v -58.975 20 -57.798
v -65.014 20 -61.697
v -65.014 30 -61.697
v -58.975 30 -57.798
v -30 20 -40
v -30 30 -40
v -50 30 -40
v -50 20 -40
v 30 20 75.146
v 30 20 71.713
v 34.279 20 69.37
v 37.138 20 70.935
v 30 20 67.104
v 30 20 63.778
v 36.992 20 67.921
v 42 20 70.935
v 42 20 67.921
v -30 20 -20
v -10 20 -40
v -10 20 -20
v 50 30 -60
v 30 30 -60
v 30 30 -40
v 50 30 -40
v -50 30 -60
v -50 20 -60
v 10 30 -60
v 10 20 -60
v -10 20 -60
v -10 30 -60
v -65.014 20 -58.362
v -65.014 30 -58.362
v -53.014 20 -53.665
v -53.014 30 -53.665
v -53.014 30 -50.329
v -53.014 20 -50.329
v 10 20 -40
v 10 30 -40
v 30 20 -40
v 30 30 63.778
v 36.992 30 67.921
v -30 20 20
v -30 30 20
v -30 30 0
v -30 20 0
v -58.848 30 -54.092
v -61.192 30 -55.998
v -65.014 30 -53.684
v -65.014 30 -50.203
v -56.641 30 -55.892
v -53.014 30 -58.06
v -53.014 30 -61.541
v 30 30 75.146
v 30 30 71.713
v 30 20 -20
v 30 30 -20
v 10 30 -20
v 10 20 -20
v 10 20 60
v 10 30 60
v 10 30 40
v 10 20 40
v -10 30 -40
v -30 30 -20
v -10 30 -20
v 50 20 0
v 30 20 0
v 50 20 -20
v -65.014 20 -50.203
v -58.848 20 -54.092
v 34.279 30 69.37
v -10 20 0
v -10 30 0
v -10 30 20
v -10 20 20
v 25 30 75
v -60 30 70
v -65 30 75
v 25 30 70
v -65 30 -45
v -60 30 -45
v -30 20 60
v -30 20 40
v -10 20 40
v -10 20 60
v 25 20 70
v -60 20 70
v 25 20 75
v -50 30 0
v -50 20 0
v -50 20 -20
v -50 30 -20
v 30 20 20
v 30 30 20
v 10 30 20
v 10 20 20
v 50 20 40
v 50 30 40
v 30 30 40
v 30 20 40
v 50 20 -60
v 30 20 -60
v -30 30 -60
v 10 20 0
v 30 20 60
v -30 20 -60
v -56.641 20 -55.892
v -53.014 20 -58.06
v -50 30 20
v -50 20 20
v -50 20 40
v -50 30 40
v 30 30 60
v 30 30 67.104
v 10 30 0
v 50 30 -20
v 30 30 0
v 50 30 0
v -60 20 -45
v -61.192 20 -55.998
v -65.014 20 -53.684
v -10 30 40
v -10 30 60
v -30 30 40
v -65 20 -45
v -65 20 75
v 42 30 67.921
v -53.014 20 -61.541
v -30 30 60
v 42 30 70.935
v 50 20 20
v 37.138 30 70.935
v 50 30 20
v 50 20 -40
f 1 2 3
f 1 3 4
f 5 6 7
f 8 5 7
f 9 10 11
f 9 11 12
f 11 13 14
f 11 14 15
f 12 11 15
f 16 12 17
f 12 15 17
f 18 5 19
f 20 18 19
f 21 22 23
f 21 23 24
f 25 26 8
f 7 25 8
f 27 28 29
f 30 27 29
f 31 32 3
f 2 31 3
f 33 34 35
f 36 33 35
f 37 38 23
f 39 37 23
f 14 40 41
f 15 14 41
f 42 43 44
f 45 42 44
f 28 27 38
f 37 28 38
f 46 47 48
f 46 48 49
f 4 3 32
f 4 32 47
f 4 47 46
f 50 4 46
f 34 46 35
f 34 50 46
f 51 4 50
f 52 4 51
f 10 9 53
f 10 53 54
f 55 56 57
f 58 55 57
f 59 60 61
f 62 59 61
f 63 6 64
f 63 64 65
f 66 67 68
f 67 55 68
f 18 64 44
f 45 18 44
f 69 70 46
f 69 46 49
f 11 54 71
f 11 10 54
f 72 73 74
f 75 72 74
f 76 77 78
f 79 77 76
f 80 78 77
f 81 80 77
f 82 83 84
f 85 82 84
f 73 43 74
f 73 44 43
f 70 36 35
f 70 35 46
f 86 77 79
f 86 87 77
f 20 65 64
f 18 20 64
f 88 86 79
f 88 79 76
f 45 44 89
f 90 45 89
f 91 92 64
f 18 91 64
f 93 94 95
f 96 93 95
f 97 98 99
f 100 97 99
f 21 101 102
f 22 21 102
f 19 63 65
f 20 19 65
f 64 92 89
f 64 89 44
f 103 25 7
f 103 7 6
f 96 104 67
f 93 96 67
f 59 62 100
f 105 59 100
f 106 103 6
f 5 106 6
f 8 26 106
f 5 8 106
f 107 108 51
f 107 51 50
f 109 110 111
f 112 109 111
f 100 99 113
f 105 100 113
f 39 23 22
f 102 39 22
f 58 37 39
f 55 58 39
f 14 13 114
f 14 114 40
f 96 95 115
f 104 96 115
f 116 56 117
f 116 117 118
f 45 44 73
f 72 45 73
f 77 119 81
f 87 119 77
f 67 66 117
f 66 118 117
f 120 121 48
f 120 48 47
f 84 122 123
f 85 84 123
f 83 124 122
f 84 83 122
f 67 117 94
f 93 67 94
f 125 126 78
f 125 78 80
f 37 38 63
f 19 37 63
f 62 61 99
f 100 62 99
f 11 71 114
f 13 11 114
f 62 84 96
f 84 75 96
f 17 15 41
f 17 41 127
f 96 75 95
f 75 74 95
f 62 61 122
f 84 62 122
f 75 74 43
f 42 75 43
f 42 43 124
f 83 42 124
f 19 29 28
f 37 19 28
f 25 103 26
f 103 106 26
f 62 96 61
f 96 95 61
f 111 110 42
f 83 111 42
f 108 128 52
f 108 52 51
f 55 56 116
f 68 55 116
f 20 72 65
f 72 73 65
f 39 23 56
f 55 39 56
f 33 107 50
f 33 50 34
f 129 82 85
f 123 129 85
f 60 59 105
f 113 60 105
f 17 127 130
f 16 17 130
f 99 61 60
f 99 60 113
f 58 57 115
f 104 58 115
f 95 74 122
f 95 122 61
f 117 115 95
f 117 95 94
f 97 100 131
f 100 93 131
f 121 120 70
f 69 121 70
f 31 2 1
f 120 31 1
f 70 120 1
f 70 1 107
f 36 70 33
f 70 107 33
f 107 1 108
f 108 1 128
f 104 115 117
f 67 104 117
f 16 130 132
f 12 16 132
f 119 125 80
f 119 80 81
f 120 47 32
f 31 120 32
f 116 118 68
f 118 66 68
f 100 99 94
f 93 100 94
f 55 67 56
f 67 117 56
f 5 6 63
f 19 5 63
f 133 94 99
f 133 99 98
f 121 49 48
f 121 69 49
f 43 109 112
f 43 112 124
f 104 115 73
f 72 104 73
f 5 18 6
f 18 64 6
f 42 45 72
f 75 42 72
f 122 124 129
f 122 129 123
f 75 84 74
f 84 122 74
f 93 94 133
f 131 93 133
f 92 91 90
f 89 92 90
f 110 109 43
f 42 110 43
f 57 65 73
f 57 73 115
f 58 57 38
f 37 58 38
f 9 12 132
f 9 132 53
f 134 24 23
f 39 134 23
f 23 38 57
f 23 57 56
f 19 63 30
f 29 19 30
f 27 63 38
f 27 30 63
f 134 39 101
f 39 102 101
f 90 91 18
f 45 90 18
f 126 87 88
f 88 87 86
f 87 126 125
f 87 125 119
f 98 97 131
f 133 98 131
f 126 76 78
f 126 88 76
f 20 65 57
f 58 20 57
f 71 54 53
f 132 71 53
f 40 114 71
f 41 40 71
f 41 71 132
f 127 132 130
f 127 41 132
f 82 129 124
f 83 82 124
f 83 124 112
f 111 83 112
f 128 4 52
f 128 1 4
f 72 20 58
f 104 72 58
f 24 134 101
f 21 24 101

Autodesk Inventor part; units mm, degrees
ref_plane "YZ Plane" through (0, 0, 0) normal (1, 0, 0) x (0, 1, 0)
ref_plane "XZ Plane" through (0, 0, 0) normal (0, 1, 0) x (-1, 0, 0)
ref_plane "XY Plane" through (0, 0, 0) normal (0, 0, 1) x (1, 0, 0)
sketch "Sketch1" plane through (0, 0, 0) normal (0, 1, 0) x (-1, 0, 0)
  line L0 (70, 80) -> (-70, 80)
  line L1 (-70, 80) -> (-70, -80)
  line L2 (-70, -80) -> (70, -80)
  line L3 (70, -80) -> (70, 80)
  point P0 (0, 0)
  dimension "d13" = 20
  dimension "d0" = 140
  dimension "d1" = 160
  dimension "d4" = 70
  dimension "d5" = 80
extrude "Extrusion1" add sketch "Sketch1" along normal blind 20
sketch "Sketch2" plane through (0, 20, 0) normal (0, 1, 0) x (1, 0, 0)
  line L0 (50, 60) -> (-50, 60)
  line L1 (-50, 60) -> (-50, -60)
  line L2 (-50, -60) -> (50, -60)
  line L3 (50, -60) -> (50, 60)
  line L4 (50, 60) -> (-50, -60) construction
  line L5 (-50, 60) -> (50, -60) construction
  point P0 (0, 0)
  dimension "d8" = 100
  dimension "d9" = 120
extrude "Extrusion2" add sketch "Sketch2" along normal blind 10
sketch "Sketch3" plane through (0, 30, 0) normal (0, 1, 0) x (1, 0, 0)
  line L0 (-50, 60) -> (-50, -60) projected
  line L1 (-50, -60) -> (-30, -60)
  line L2 (-30, -60) -> (-30, -40)
  line L3 (-30, -40) -> (-50, -40)
  line L4 (-50, -40) -> (-50, -60)
  line L5 (-10, -60) -> (10, -60)
  line L6 (10, -60) -> (10, -40)
  line L7 (10, -40) -> (-10, -40)
  line L8 (-10, -40) -> (-10, -60)
  line L9 (10, -40) -> (30, -40)
  line L10 (30, -40) -> (30, -20)
  line L11 (30, -20) -> (10, -20)
  line L12 (10, -20) -> (10, -40)
  line L13 (-30, -40) -> (-10, -40)
  line L14 (-10, -40) -> (-10, -20)
  line L15 (-10, -20) -> (-30, -20)
  line L16 (-30, -20) -> (-30, -40)
  line L17 (-50, -60) -> (50, -60) projected
  line L18 (-53.5785, -189.3047) -> (-33.5785, -189.3047)
  line L19 (-33.5785, -189.3047) -> (-33.5785, -169.3047)
  line L20 (-33.5785, -169.3047) -> (-53.5785, -169.3047)
  line L21 (-53.5785, -169.3047) -> (-53.5785, -189.3047)
  line L22 (-50, -20) -> (-30, -20)
  line L23 (-30, -20) -> (-30, 0)
  line L24 (-30, 0) -> (-50, 0)
  line L25 (-50, 0) -> (-50, -20)
  line L26 (-10, -20) -> (10, -20)
  line L27 (10, -20) -> (10, 0)
  line L28 (10, 0) -> (-10, 0)
  line L29 (-10, 0) -> (-10, -20)
  line L30 (10, 40) -> (30, 40)
  line L31 (30, 40) -> (30, 60)
  line L32 (30, 60) -> (10, 60)
  line L33 (10, 60) -> (10, 40)
  line L34 (-10, 20) -> (-30, 20)
  line L35 (-30, 0) -> (-10, 0)
  line L36 (-30, 20) -> (-30, 0)
  line L37 (-10, 0) -> (-10, 20)
  line L38 (10, 40) -> (-10, 40)
  line L39 (-10, 20) -> (10, 20)
  line L40 (-10, 40) -> (-10, 20)
  line L41 (10, 20) -> (10, 40)
  line L42 (30, 20) -> (10, 20)
  line L43 (10, 0) -> (30, 0)
  line L44 (10, 20) -> (10, 0)
  line L45 (30, 0) -> (30, 20)
  line L46 (-10, 60) -> (-30, 60)
  line L47 (-30, 40) -> (-10, 40)
  line L48 (-30, 60) -> (-30, 40)
  line L49 (-10, 40) -> (-10, 60)
  line L50 (-30, 40) -> (-50, 40)
  line L51 (-50, 20) -> (-30, 20)
  line L52 (-50, 40) -> (-50, 20)
  line L53 (-30, 20) -> (-30, 40)
  line L54 (30, 20) -> (50, 20)
  line L55 (50, 20) -> (50, 40)
  line L56 (50, 40) -> (30, 40)
  line L57 (30, 40) -> (30, 20)
  line L58 (30, -20) -> (50, -20)
  line L59 (50, -20) -> (50, 0)
  line L60 (50, 0) -> (30, 0)
  line L61 (30, 0) -> (30, -20)
  line L62 (30, -60) -> (50, -60)
  line L63 (50, -60) -> (50, -40)
  line L64 (50, -40) -> (30, -40)
  line L65 (30, -40) -> (30, -60)
  dimension "d12" = 20
  dimension "d13" = 20
  dimension "d14" = 20
  dimension "d15" = 20
  dimension "d17" = 20
  dimension "d18" = 20
  dimension "d19" = 20
  dimension "d21" = 20
  dimension "d22" = 20
  dimension "d25" = 20
  dimension "d26" = 20
  dimension "d27" = 20
  dimension "d28" = 20
  dimension "d30" = 20
  dimension "d31" = 20
  dimension "d33" = 20
  dimension "d34" = 20
  dimension "d36" = 20
  dimension "d37" = 20
  dimension "d39" = 20
  dimension "d40" = 20
  dimension "d42" = 20
  dimension "d43" = 20
  dimension "d45" = 20
  dimension "d46" = 20
  dimension "d48" = 20
  dimension "d49" = 20
  dimension "d77" = 20
  dimension "d78" = 20
  dimension "d80" = 20
  dimension "d81" = 20
  dimension "d83" = 20
  dimension "d84" = 20
extrude "Extrusion5" cut sketch "Sketch3" against normal blind 10 contours L50 L53 L51 L0 | L48 L46 L49 L47 | L24 L23 L22 L0 | L34 L37 L35 L36 | L38 L41 L39 L40 | L33 L32 L31 L30 | L3 L2 L1 L0 | L15 L14 L13 L16 | L28 L27 L26 L29 | L42 L45 L43 L44 | L56 L55 L54 L57 | L7 L6 L5 L8 | L11 L10 L9 L12 | L60 L59 L58 L61 | L64 L63 L17 L65
sketch "Sketch4" plane through (0, 20, 0) normal (0, 1, 0) x (1, 0, 0)
  line L0 (-65, -75) -> (-65, 45)
  line L1 (-65, 45) -> (-60, 45)
  line L2 (-60, 45) -> (-60, -70)
  line L3 (-60, -70) -> (25, -70)
  line L4 (25, -70) -> (25, -75)
  line L5 (25, -75) -> (-65, -75)
  line L6 (-70, -80) -> (70, -80) projected
  line L7 (-70, 80) -> (-70, -80) projected
  line L8 (-53.0136, 61.5997) -> (-53.0136, 50) construction
  line L9 (-53.0136, 50) -> (-65.2641, 50) construction
  line L10 (-65.2641, 50) -> (-65.2641, 61.5997) construction
  line L11 (-65.2641, 61.5997) -> (-53.0136, 61.5997) construction
  line L12 (30, -75) -> (30, -63.5159) construction
  line L13 (30, -63.5159) -> (34.1954, -63.5159) construction
  line L14 (34.1954, -63.5159) -> (34.1954, -75) construction
  line L15 (34.1954, -75) -> (30, -75) construction
  line L16 (-65.0136, 50.2026) -> (-65.0136, 53.684)
  line L17 (-65.0136, 53.684) -> (-61.1919, 55.9984)
  line L18 (-61.1919, 55.9984) -> (-65.0136, 58.3615)
  line L19 (-65.0136, 58.3615) -> (-65.0136, 61.697)
  line L20 (-65.0136, 61.697) -> (-58.9747, 57.7975)
  line L21 (-58.9747, 57.7975) -> (-53.0136, 61.5414)
  line L22 (-53.0136, 61.5414) -> (-53.0136, 58.06)
  line L23 (-53.0136, 58.06) -> (-56.6408, 55.8915)
  line L24 (-56.6408, 55.8915) -> (-53.0136, 53.6646)
  line L25 (-53.0136, 53.6646) -> (-53.0136, 50.3291)
  line L26 (-53.0136, 50.3291) -> (-58.8483, 54.0924)
  line L27 (-58.8483, 54.0924) -> (-65.0136, 50.2026)
  line L28 (30, -63.778) -> (36.9919, -67.9206)
  line L29 (36.9919, -67.9206) -> (42, -67.9206)
  line L30 (42, -67.9206) -> (42, -70.9352)
  line L31 (42, -70.9352) -> (37.1378, -70.9352)
  line L32 (37.1378, -70.9352) -> (30, -75.1459)
  line L33 (30, -75.1459) -> (30, -71.7131)
  line L34 (30, -71.7131) -> (34.2788, -69.3695)
  line L35 (34.2788, -69.3695) -> (30, -67.1037)
  line L36 (30, -67.1037) -> (30, -63.778)
  point P0 (0, 0)
  point P1 (-62.5, 45)
  point P2 (-58.8748, 54.3197)
  point P3 (25, -72.5)
  point P4 (28.8521, -69.3123)
  point P5 (28.8521, -69.3123)
  dimension "d53" = 5
  dimension "d54" = 5
  dimension "d55" = 5
  dimension "d56" = 5
  dimension "d57" = 120
  dimension "d58" = 90
  dimension "d63" = 12.2505
  dimension "d73" = 5
  dimension "d88" = 5
  dimension "d90" = 5
extrude "Extrusion4" add sketch "Sketch4" along normal blind 10
sketch "Sketch5" plane through (0, 20, 0) normal (0, 1, 0) x (1, 0, 0)
  line L0 (81.623, -86.9868) -> (-81.623, -86.9868)
  line L1 (-81.623, -86.9868) -> (-81.623, 86.9868)
  line L2 (-81.623, 86.9868) -> (81.623, 86.9868)
  line L3 (81.623, 86.9868) -> (81.623, -86.9868)
  line L4 (81.623, -86.9868) -> (-81.623, 86.9868) construction
  line L5 (-81.623, -86.9868) -> (81.623, 86.9868) construction
  point P0 (0, 0)
extrude "Extrusion6" cut sketch "Sketch5" against normal blind 20
equation "\"d13\" = cell"
equation "\"d4\" = 0.5 * d0"
equation "\"d5\" = 0.5 * d1"
equation "\"d12\" = cell"
equation "\"d14\" = d16"
equation "\"d15\" = d16"
equation "\"d17\" = cell"
equation "\"d18\" = d20"
equation "\"d19\" = d20"
equation "\"d21\" = d23"
equation "\"d22\" = d23"
equation "\"d25\" = cell"
equation "\"d26\" = cell"
equation "\"d27\" = d29"
equation "\"d28\" = d29"
equation "\"d30\" = d32"
equation "\"d31\" = d32"
equation "\"d33\" = d35"
equation "\"d34\" = d35"
equation "\"d36\" = d38"
equation "\"d37\" = d38"
equation "\"d39\" = d41"
equation "\"d40\" = d41"
equation "\"d42\" = d44"
equation "\"d43\" = d44"
equation "\"d45\" = d47"
equation "\"d46\" = d47"
equation "\"d48\" = d50"
equation "\"d49\" = d50"
equation "\"cell\" = 20"
equation "\"d16\" = 20"
equation "\"d20\" = 20"
equation "\"d23\" = 20"
equation "\"d29\" = 20"
equation "\"d32\" = 20"
equation "\"d35\" = 20"
equation "\"d38\" = 20"
equation "\"d41\" = 20"
equation "\"d44\" = 20"
equation "\"d47\" = 20"
equation "\"d50\" = 20"
properties part number "3D_Grid_black_cells" material "Acetal Resin, Black"
